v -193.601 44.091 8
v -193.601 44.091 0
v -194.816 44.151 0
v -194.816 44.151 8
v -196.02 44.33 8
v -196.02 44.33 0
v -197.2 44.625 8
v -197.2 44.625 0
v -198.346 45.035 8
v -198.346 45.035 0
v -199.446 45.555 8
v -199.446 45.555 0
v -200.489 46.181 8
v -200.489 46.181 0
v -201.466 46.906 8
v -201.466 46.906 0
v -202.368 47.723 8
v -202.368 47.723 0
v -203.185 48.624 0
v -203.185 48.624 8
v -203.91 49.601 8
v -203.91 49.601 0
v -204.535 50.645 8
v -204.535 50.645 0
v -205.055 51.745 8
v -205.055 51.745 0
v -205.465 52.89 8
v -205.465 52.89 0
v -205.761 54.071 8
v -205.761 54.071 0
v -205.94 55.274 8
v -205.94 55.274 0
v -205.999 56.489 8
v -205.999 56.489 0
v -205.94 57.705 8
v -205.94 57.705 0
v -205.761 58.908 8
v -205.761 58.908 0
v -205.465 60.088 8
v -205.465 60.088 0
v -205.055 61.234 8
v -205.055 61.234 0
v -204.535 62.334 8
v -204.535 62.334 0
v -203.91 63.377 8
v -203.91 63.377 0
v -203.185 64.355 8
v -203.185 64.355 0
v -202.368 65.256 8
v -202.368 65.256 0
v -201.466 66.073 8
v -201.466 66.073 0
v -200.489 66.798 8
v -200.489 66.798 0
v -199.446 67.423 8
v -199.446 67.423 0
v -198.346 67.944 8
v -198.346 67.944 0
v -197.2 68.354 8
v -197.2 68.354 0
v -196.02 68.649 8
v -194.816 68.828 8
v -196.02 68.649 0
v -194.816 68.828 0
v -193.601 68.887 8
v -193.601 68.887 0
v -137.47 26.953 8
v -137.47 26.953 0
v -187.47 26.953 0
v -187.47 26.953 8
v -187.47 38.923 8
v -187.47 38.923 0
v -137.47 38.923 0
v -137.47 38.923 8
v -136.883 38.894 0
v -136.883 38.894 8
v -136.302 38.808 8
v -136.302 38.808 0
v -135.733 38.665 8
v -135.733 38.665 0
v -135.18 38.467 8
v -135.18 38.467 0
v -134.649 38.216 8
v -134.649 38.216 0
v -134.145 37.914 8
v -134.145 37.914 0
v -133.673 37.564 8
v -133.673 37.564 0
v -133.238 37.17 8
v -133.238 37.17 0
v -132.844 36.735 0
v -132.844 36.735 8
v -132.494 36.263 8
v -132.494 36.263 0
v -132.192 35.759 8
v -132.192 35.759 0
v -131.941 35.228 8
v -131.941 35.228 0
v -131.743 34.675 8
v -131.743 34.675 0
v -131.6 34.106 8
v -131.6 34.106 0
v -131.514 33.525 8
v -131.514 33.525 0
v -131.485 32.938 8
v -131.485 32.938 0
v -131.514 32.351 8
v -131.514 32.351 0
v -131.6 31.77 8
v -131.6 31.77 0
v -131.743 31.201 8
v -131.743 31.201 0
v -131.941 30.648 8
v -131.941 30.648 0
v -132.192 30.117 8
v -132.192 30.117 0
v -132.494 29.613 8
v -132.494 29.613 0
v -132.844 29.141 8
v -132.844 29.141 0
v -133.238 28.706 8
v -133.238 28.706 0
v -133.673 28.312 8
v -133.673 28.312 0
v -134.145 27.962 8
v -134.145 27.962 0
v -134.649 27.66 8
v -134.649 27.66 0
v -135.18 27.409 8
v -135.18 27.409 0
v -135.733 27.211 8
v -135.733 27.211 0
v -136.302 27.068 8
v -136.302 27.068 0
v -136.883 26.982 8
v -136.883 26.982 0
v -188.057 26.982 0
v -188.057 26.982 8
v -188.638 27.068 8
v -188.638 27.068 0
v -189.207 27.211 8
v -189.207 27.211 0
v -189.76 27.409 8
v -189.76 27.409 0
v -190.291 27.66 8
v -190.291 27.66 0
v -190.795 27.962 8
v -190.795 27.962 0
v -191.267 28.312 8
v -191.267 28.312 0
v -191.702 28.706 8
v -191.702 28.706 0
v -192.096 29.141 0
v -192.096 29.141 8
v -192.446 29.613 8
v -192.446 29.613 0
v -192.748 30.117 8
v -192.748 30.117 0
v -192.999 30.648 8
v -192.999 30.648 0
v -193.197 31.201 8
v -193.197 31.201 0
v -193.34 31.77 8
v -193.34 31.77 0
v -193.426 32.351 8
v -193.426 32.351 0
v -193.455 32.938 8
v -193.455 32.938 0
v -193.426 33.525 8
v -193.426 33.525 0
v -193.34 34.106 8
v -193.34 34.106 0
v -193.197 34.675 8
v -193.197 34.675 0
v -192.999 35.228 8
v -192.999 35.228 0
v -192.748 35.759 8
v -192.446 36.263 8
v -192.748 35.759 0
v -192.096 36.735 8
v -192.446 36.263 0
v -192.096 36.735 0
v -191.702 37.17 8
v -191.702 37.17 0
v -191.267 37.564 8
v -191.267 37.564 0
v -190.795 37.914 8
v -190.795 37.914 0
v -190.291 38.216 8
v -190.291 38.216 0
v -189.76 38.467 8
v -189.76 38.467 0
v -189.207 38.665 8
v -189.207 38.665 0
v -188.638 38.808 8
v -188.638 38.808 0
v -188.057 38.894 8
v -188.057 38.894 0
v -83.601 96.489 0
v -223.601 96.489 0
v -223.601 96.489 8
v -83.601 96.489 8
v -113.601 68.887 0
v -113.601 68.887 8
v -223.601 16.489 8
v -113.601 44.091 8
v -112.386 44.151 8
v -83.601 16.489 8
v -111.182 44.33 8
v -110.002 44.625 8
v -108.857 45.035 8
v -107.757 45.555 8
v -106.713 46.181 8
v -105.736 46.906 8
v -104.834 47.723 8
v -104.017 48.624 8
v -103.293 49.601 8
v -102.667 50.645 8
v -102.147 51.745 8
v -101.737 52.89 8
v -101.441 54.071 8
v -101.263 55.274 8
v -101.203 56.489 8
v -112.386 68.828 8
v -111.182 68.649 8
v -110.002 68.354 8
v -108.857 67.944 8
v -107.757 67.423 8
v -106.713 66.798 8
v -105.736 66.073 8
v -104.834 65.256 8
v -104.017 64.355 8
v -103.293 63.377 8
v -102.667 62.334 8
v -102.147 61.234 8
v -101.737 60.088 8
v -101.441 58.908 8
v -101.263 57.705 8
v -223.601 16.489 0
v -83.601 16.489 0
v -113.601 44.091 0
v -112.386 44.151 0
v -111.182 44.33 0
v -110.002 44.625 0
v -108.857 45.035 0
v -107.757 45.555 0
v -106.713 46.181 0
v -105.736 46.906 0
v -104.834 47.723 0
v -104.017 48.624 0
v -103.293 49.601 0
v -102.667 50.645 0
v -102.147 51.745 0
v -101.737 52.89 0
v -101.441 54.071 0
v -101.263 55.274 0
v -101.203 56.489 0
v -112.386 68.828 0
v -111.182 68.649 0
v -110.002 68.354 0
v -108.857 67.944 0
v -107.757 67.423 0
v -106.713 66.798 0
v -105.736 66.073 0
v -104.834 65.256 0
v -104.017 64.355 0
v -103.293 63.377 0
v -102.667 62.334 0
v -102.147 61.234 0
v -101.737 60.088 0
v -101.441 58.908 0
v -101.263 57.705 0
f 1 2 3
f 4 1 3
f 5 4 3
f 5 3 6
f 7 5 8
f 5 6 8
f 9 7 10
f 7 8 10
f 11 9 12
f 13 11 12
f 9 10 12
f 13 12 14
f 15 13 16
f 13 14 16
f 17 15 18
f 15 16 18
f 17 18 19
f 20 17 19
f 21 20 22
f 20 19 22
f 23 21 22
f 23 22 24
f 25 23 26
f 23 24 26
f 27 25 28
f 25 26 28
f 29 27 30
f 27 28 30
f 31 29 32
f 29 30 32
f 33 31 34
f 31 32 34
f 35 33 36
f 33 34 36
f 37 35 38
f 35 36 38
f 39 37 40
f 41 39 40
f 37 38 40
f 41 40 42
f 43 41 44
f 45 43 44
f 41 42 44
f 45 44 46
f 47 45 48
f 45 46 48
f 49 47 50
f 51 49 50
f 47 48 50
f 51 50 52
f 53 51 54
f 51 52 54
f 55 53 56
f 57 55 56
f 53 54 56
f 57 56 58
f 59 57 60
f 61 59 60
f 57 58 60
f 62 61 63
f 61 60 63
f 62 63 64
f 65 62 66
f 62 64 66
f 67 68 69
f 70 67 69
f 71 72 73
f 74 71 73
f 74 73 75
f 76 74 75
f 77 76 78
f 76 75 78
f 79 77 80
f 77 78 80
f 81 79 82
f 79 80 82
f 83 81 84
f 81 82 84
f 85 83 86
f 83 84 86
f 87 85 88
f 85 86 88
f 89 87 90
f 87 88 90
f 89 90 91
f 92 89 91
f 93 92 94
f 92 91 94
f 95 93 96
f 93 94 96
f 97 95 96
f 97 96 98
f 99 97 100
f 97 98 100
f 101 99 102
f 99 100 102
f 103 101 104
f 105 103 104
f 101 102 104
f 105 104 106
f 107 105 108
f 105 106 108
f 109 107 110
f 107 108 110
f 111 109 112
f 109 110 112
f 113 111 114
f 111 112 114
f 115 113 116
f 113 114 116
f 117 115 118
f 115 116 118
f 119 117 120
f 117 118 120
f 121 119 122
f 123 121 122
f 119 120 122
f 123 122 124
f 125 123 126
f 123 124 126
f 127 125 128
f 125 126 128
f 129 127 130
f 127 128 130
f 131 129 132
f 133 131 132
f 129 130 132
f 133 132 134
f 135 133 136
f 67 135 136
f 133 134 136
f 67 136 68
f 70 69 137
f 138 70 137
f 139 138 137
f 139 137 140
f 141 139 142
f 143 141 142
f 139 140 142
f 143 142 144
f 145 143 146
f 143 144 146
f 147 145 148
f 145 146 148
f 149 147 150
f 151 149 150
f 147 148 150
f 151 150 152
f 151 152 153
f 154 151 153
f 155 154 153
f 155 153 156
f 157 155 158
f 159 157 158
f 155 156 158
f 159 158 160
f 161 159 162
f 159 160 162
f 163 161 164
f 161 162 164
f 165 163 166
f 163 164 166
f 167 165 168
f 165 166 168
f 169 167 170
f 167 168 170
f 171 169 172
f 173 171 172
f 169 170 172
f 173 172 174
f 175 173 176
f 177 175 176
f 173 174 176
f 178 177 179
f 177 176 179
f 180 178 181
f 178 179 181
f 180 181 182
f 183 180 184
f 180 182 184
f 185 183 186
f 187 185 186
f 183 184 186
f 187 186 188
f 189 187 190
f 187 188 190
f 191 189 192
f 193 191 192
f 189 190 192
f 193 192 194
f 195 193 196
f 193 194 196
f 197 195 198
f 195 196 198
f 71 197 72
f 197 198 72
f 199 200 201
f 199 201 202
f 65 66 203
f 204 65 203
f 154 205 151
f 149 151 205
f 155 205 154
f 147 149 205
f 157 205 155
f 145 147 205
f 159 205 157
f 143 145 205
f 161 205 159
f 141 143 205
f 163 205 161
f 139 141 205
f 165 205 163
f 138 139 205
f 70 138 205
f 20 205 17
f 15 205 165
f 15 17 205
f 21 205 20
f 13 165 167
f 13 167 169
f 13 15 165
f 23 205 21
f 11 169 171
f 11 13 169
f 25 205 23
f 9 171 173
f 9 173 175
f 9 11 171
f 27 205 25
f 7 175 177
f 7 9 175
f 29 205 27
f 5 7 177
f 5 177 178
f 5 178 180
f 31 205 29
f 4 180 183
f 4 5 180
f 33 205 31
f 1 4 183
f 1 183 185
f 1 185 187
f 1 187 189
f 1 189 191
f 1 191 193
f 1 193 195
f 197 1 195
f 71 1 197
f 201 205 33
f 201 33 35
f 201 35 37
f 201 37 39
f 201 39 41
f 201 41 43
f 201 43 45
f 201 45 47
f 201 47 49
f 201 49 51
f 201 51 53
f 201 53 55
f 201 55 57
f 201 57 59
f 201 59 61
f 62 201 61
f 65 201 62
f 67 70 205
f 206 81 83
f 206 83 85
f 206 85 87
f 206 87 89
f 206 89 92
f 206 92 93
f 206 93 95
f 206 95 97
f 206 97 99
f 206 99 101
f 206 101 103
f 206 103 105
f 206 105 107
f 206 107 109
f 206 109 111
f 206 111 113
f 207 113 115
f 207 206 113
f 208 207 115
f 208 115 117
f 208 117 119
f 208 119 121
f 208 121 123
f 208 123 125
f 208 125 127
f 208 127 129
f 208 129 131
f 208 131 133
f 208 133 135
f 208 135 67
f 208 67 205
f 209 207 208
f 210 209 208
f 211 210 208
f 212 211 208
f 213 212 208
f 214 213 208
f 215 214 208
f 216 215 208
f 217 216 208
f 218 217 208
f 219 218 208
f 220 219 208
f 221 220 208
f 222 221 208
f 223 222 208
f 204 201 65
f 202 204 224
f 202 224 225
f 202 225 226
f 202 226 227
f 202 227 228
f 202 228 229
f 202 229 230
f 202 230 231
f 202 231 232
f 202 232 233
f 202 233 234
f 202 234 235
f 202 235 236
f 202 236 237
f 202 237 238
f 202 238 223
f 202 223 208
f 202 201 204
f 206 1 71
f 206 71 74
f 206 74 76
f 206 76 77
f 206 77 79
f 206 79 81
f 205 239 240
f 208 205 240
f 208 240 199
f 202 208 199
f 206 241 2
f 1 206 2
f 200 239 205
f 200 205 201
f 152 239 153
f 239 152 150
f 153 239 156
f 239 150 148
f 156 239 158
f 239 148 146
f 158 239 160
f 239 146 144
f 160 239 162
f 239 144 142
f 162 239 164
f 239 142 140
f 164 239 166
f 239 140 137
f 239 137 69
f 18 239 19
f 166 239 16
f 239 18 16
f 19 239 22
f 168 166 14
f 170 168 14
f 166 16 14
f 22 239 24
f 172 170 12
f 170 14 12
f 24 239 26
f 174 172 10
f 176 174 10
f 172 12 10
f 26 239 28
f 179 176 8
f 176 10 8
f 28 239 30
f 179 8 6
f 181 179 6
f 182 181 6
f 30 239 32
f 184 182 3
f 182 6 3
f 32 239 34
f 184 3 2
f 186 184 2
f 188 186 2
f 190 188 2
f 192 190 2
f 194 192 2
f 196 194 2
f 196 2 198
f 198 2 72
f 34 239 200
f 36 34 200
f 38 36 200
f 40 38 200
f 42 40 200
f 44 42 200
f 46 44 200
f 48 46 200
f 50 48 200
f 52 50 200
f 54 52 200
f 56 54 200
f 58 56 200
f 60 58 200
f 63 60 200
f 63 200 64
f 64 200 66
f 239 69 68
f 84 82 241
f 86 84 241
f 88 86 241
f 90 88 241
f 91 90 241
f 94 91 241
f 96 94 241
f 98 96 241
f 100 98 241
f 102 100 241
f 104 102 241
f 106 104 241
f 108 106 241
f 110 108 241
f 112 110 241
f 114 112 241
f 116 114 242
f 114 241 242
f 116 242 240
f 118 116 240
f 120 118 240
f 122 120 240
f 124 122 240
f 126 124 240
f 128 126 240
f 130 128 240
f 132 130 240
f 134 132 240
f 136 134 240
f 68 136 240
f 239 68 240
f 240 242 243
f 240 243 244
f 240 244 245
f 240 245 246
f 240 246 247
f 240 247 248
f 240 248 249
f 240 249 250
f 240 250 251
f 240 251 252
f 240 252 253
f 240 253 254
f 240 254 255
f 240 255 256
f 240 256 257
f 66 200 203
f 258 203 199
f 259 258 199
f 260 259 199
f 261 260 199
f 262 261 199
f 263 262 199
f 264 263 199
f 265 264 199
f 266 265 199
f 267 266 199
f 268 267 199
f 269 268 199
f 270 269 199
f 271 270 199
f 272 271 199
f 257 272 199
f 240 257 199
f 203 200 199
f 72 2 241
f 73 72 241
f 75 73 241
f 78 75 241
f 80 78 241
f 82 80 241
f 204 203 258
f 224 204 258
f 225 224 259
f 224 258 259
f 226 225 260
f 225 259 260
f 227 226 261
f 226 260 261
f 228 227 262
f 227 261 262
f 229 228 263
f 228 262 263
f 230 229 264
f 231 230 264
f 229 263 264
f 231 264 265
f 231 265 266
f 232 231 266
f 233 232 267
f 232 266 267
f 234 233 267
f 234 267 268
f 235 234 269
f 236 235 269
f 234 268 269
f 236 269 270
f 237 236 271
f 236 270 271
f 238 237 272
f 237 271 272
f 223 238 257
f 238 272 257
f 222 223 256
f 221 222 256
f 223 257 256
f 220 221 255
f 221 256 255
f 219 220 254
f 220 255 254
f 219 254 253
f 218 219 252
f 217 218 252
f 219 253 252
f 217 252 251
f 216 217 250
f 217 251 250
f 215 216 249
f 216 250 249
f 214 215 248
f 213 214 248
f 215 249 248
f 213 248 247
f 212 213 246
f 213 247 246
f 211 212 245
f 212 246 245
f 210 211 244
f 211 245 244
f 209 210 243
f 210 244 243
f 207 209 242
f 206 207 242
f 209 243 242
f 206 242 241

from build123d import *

# Parameters (mm, degrees)
ESQUISSE8_W        = 140
ESQUISSE8_H        = 80
BOSS_EXTRU_7_DEPTH = 8


with BuildPart() as part:
    # Esquisse8 → Boss.-Extru.7 (new body)
    with BuildSketch(Plane.XY):
        with Locations((-153.601186705, 56.489400981)):
            Rectangle(ESQUISSE8_W, ESQUISSE8_H)
        with BuildLine():
            Line((-193.601186705, 68.887436176), (-113.601186705, 68.887436176))
            ThreePointArc((-113.601186705, 68.887436176), (-101.203151511, 56.489400981), (-113.601186705, 44.091365787))
            Line((-113.601186705, 44.091365787), (-193.601186705, 44.091365787))
            ThreePointArc((-193.601186705, 44.091365787), (-205.9992219, 56.489400981), (-193.601186705, 68.887436176))
        make_face(mode=Mode.SUBTRACT)
        with BuildLine():
            Line((-187.470030447, 38.922719402), (-137.470030447, 38.922719402))
            ThreePointArc((-137.470030447, 38.922719402), (-131.485282002, 32.937970956), (-137.470030447, 26.953222511))
            Line((-137.470030447, 26.953222511), (-187.470030447, 26.953222511))
            ThreePointArc((-187.470030447, 26.953222511), (-193.454778893, 32.937970956), (-187.470030447, 38.922719402))
        make_face(mode=Mode.SUBTRACT)
    extrude(amount=BOSS_EXTRU_7_DEPTH)


solid = part.part
